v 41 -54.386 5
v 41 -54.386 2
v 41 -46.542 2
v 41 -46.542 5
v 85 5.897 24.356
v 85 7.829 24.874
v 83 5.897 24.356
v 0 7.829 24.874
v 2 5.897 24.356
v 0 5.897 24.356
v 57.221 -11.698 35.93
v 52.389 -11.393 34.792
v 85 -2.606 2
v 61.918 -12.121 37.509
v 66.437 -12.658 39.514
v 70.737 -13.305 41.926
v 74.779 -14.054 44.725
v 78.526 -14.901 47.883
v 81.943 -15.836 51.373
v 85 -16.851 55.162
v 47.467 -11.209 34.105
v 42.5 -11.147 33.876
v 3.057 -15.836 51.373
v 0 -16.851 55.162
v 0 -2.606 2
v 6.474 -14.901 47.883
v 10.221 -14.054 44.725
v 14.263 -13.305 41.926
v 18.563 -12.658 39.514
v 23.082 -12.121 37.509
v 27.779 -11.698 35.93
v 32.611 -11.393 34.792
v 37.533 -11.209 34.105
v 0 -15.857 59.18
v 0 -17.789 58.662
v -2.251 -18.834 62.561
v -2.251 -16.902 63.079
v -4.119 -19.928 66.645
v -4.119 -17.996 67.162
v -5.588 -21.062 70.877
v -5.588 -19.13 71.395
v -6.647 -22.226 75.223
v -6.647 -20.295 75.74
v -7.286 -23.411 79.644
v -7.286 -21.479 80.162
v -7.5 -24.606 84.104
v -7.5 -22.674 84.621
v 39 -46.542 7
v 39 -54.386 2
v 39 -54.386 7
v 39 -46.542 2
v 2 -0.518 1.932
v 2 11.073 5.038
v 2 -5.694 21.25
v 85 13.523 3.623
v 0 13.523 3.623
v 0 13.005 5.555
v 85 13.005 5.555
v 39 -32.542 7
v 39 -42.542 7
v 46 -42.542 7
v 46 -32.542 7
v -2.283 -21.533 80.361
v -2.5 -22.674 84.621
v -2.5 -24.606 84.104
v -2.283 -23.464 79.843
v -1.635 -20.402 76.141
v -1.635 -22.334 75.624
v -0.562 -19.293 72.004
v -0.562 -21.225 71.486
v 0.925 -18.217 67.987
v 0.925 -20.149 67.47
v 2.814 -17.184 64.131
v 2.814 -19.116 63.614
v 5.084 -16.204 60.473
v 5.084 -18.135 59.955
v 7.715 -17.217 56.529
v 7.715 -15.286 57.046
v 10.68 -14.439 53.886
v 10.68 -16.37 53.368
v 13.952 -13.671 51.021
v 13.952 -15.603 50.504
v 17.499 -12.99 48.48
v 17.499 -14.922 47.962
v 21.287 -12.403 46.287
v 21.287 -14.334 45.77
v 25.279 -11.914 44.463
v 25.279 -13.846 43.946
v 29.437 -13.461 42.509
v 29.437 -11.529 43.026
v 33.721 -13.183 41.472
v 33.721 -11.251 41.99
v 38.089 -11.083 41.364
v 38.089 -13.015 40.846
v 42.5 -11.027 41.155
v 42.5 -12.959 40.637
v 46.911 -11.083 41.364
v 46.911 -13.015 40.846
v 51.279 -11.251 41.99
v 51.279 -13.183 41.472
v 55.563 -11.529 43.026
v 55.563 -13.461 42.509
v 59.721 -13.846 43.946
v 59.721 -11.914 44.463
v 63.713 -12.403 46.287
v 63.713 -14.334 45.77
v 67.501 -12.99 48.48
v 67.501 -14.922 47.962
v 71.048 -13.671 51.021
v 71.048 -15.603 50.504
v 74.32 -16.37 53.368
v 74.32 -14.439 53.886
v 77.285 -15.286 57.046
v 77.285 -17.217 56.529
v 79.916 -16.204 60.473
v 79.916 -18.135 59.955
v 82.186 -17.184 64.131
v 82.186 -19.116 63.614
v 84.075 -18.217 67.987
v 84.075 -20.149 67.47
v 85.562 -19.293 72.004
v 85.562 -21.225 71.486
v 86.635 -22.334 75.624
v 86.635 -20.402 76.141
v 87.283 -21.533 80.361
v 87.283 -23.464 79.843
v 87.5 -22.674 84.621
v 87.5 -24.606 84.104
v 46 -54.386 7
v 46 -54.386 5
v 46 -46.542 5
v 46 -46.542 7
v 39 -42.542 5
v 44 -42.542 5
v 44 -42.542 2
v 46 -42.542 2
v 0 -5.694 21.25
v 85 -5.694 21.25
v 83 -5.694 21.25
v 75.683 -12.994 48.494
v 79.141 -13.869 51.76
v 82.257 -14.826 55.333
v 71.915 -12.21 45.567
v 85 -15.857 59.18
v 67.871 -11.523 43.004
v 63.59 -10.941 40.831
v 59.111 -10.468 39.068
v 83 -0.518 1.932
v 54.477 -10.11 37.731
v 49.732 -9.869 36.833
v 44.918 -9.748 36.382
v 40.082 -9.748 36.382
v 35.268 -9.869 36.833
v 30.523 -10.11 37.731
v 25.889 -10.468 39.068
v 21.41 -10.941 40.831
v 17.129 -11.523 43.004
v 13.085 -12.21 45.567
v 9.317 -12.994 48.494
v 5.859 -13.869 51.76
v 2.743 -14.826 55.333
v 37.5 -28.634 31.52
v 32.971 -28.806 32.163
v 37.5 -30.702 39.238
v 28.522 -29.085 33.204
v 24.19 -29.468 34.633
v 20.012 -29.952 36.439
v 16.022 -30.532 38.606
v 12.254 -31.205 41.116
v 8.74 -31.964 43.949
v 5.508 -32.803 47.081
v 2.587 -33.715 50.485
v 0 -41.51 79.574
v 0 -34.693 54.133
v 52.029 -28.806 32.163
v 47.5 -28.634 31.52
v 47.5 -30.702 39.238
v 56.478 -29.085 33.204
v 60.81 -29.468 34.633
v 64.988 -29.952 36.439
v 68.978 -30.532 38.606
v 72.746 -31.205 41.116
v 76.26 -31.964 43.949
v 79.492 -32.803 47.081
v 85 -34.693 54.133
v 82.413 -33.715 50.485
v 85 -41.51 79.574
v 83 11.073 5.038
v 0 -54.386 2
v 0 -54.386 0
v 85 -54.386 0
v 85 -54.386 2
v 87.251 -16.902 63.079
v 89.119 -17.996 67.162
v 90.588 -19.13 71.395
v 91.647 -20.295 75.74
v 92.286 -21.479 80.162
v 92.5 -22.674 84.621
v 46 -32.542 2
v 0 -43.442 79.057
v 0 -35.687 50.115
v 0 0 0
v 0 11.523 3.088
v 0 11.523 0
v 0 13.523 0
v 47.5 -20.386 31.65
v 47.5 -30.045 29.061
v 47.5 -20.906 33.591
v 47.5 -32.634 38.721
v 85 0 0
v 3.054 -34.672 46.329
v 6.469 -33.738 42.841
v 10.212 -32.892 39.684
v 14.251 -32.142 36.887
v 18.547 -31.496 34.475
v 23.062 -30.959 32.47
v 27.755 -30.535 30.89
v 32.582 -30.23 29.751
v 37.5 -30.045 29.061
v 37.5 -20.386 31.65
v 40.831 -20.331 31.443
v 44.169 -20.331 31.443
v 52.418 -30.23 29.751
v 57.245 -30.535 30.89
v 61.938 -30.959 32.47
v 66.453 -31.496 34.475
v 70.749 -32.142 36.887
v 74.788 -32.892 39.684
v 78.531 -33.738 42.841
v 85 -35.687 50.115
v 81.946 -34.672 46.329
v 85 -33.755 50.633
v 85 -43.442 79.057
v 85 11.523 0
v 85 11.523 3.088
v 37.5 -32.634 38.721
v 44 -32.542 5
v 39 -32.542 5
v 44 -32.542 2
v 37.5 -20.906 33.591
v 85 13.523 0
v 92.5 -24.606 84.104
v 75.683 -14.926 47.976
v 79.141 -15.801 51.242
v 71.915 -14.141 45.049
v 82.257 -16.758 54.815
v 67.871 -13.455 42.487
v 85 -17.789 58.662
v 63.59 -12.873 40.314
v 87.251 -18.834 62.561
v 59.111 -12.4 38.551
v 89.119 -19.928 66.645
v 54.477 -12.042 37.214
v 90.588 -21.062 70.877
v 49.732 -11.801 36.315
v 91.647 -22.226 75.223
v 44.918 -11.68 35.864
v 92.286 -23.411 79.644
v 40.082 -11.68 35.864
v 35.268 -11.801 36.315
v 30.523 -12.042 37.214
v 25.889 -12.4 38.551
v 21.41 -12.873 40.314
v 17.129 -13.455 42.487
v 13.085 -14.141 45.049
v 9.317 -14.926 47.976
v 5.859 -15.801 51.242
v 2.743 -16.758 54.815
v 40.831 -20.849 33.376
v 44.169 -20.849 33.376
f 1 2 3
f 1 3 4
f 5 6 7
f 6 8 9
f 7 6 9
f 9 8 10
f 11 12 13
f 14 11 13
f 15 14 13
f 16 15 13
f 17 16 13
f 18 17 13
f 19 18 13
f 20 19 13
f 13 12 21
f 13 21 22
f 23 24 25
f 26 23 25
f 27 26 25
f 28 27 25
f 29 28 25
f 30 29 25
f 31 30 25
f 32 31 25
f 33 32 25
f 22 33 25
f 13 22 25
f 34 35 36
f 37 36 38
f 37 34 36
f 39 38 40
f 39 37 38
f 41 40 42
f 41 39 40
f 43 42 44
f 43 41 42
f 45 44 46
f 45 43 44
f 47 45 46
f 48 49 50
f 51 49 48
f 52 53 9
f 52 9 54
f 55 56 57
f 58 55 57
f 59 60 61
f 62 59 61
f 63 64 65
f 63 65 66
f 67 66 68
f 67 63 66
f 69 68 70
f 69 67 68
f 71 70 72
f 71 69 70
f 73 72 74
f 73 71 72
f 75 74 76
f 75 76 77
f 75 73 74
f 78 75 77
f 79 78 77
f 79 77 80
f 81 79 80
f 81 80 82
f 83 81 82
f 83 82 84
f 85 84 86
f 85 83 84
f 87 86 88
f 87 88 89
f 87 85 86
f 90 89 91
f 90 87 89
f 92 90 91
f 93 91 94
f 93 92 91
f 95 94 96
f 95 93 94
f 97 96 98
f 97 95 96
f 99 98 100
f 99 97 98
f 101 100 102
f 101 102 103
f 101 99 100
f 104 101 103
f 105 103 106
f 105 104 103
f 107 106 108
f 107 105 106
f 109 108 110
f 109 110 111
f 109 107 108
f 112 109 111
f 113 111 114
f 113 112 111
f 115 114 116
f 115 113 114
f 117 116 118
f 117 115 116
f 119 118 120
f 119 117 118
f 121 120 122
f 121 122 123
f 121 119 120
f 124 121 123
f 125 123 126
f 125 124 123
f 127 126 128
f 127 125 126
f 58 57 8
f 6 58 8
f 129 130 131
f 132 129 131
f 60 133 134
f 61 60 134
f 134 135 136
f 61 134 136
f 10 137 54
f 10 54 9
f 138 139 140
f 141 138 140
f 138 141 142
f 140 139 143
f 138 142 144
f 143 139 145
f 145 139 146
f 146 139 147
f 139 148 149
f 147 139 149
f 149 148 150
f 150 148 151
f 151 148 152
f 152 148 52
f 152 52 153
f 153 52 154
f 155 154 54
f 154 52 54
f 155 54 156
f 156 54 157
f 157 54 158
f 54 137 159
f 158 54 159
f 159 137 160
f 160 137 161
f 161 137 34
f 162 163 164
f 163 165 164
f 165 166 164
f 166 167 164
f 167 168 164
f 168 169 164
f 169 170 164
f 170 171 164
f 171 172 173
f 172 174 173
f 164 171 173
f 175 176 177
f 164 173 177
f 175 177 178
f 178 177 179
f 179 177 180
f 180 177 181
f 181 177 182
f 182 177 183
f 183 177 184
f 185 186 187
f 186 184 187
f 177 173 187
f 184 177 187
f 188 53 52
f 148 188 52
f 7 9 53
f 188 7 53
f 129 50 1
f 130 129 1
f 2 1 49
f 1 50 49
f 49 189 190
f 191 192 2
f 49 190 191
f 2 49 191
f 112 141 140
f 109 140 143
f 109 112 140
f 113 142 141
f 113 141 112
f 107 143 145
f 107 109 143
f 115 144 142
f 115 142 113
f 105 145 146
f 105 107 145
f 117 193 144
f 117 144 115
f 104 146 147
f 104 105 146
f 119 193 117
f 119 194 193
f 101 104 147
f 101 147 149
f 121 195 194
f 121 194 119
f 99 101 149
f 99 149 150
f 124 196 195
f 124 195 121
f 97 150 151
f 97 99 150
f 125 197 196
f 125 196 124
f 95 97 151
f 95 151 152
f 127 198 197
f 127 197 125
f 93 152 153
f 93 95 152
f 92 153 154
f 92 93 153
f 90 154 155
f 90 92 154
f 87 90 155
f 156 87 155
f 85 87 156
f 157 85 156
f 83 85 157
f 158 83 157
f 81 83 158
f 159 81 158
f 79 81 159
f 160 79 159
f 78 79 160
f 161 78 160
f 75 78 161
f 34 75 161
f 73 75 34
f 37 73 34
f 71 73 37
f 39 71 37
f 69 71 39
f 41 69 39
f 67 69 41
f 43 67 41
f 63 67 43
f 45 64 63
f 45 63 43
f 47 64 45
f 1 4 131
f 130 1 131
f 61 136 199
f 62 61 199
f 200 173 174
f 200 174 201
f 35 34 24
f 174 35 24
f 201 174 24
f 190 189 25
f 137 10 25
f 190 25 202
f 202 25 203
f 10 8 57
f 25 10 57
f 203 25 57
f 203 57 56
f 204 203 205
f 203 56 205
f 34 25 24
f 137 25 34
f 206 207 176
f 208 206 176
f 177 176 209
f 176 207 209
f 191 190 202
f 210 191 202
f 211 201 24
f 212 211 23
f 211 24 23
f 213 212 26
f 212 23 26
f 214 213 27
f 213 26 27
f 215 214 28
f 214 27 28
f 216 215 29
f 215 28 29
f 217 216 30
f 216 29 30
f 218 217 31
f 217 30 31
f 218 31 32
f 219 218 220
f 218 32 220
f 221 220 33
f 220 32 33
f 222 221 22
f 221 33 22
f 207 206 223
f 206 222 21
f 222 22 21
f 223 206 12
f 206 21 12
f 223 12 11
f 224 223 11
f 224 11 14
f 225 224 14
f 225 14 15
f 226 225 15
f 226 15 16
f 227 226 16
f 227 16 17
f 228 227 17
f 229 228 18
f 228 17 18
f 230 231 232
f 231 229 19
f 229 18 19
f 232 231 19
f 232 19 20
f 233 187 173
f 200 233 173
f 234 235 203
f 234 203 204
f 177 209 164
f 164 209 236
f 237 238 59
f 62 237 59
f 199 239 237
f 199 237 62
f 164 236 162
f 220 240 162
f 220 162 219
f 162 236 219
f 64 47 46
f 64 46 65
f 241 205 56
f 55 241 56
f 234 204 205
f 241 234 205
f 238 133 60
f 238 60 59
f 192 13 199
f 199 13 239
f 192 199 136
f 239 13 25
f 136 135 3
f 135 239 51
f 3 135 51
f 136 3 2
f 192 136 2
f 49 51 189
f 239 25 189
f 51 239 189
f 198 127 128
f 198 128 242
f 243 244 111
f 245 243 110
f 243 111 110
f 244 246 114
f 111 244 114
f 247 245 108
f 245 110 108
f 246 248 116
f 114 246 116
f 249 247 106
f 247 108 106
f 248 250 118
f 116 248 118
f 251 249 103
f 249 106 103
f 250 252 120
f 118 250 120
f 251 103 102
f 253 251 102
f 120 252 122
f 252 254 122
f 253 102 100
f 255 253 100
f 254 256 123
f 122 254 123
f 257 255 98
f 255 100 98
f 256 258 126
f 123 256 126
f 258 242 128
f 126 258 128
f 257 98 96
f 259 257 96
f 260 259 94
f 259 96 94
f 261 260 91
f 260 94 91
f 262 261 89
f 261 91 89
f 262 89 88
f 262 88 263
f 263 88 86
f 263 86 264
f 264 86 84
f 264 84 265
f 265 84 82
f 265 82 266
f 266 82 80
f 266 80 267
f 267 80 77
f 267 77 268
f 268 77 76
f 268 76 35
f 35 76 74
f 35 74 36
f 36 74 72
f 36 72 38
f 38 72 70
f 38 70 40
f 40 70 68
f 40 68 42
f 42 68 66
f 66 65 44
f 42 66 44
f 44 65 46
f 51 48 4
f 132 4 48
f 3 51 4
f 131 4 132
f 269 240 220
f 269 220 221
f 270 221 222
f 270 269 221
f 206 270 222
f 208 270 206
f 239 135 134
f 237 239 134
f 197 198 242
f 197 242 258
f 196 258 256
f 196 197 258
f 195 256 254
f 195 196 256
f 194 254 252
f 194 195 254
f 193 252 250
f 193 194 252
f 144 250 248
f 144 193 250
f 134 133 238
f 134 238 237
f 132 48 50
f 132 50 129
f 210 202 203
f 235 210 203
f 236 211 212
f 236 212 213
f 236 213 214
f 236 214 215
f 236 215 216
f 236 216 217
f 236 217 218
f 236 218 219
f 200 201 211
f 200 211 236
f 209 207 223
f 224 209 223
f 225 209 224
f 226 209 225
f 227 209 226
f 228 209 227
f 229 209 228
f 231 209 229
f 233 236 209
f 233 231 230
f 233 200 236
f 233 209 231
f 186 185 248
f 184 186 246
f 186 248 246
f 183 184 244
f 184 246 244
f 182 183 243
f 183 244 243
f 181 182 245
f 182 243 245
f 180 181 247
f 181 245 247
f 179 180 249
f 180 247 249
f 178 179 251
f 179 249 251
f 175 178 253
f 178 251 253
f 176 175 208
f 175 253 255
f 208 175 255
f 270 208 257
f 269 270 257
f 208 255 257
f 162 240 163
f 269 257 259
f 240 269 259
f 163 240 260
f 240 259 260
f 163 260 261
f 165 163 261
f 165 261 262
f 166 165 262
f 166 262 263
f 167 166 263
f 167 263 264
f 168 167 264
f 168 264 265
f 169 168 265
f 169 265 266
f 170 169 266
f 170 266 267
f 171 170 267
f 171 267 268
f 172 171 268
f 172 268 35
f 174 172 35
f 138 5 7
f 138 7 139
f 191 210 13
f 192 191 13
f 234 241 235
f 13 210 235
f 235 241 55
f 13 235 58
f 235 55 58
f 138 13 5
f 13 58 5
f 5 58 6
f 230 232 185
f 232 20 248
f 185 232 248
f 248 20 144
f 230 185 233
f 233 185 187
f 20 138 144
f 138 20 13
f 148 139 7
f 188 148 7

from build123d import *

# Parameters (mm, degrees)
F1_DEPTH  = 85
F3_DEPTH  = 2
F5_DEPTH  = 2
F7_DEPTH  = 25
F9_DEPTH  = 17.5
F11_DEPTH = 2
F13_DEPTH = 10
F15_DEPTH = 2
F16_W     = 7
F16_H     = 10
F17_DEPTH = 5
F18_W     = 5
F18_H     = 3
F19_DEPTH = 25
F20_W     = 7
F20_H     = 7.8445977569
F21_DEPTH = 5
F22_W     = 5
F22_H     = 3
F23_DEPTH = 8


with BuildPart() as f1:
    # F0 (on Right) → F1 (new body)
    with BuildSketch(Plane.YZ):
        Polygon((-54.3862693012, 2), (-54.3862693012, 0), (0, 0), (11.522961568, 3.0875682466), (11.522961568, 0), (13.522961568, 0), (13.522961568, 3.6234666314), (13.0053234778, 5.555318284), (7.8289425758, 24.8738348098), (5.8970909232, 24.3561967196), (11.0734718253, 5.0376801938), (-0.5176380902, 1.9318516526), (-23.2389682748, 86.7290103171), (-25.1708199274, 86.2113722269), (-2.6064507457, 2), align=None)
    extrude(amount=F1_DEPTH)

    # F2 (on face) → F3 (join)
    with BuildSketch(Plane.YZ.offset(85)):
        Polygon((11.0734718253, 5.0376801938), (5.8970909232, 24.3561967196), (-5.6940189923, 21.2503681784), (-0.5176380902, 1.9318516526), align=None)
    extrude(amount=-F3_DEPTH)

    # F4 (on face) → F5 (join)
    with BuildSketch(Plane(origin=(0, 0, 0), x_dir=(0, -1, 0), z_dir=(-1, 0, 0))):
        Polygon((5.6940189923, 21.2503681784), (-5.8970909232, 24.3561967196), (-11.0734718253, 5.0376801938), (0.5176380902, 1.9318516526), align=None)
    extrude(amount=-F5_DEPTH)

    # F6 (on face) → F7 (cut)
    with BuildSketch(Plane(origin=(0, -1.9318516526, -0.5176380902), x_dir=(1, 0, 0), z_dir=(0, -0.9659258263, -0.2588190451))):
        with BuildLine():
            ThreePointArc((0, 61.2673163635), (56.1930639376, 39.5179905915), (92.5, 87.6064507457))
            ThreePointArc((92.5, 87.6064507457), (28.8069360624, 135.6949108999), (0, 61.2673163635))
        make_face()
    extrude(amount=-F7_DEPTH, mode=Mode.SUBTRACT)

    # F8 (on face) → F9 (join)
    with BuildSketch(Plane(origin=(0, -1.9318516526, -0.5176380902), x_dir=(1, 0, 0), z_dir=(0, -0.9659258263, -0.2588190451))):
        with BuildLine():
            ThreePointArc((85, 61.2673163636), (42.5, 37.6064507457), (0, 61.2673163636))
            Line((0, 61.2673163636), (0, 57.6439742125))
            ThreePointArc((0, 57.6439742125), (42.5, 35.6064507457), (85, 57.6439742125))
            Line((85, 57.6439742125), (85, 61.2673163636))
        make_face()
    extrude(amount=F9_DEPTH)

    # F10 (on face) → F11 (join)
    with BuildSketch(Plane(origin=(0, -18.8355536126, -5.0469713795), x_dir=(1, 0, 0), z_dir=(0, -0.9659258263, -0.2588190451))):
        with BuildLine():
            Line((0, 61.2673163636), (0, 57.6439742125))
            ThreePointArc((0, 57.6439742125), (42.5, 35.6064507457), (85, 57.6439742125))
            Line((85, 57.6439742125), (85, 61.2673163636))
            Line((85, 61.2673163636), (85, 87.6064507457))
            Line((85, 87.6064507457), (0, 87.6064507457))
            Line((0, 87.6064507457), (0, 61.2673163636))
        make_face()
    extrude(amount=F11_DEPTH)

    # F12 (on face) → F13 (cut)
    with BuildSketch(Plane(origin=(0, -20.7674052652, -5.5646094697), x_dir=(1, 0, 0), z_dir=(0, -0.9659258263, -0.2588190451))):
        with BuildLine():
            Line((37.5, 45.8473935673), (37.5, 35.8473935673))
            ThreePointArc((37.5, 35.8473935673), (42.5, 35.6064507457), (47.5, 35.8473935673))
            Line((47.5, 35.8473935673), (47.5, 45.8473935673))
            Line((47.5, 45.8473935673), (37.5, 45.8473935673))
        make_face()
    extrude(amount=-F13_DEPTH, mode=Mode.SUBTRACT)

    # F14 (on face) → F15 (join)
    with BuildSketch(Plane(origin=(0, 0, 0), x_dir=(-1, 0, 0), z_dir=(0, 0.9659258263, 0.2588190451))):
        with BuildLine():
            ThreePointArc((-92.5, 87.6064507457), (-42.5, 37.6064507457), (7.5, 87.6064507457))
            Line((7.5, 87.6064507457), (2.5, 87.6064507457))
            ThreePointArc((2.5, 87.6064507457), (-42.5, 42.6064507457), (-87.5, 87.6064507457))
            Line((-87.5, 87.6064507457), (-92.5, 87.6064507457))
        make_face()
    extrude(amount=-F15_DEPTH)

    # F16 (on face) → F17 (join)
    with BuildSketch(Plane.XY.offset(2)):
        with Locations((42.5, -37.5416715443)):
            Rectangle(F16_W, F16_H)
    extrude(amount=F17_DEPTH)

    # F18 (on face) → F19 (cut)
    with BuildSketch(Plane.XZ.offset(42.5416715443)):
        with Locations((41.5, 3.5)):
            Rectangle(F18_W, F18_H)
    extrude(amount=-F19_DEPTH, mode=Mode.SUBTRACT)

    # F20 (on face) → F21 (join)
    with BuildSketch(Plane.XY.offset(2)):
        with Locations((42.5, -50.4639704227)):
            Rectangle(F20_W, F20_H)
    extrude(amount=F21_DEPTH)

    # F22 (on face) → F23 (cut)
    with BuildSketch(Plane.XZ.offset(54.3862693012)):
        with Locations((43.5, 3.5)):
            Rectangle(F22_W, F22_H)
    extrude(amount=-F23_DEPTH, mode=Mode.SUBTRACT)


solid = f1.part
